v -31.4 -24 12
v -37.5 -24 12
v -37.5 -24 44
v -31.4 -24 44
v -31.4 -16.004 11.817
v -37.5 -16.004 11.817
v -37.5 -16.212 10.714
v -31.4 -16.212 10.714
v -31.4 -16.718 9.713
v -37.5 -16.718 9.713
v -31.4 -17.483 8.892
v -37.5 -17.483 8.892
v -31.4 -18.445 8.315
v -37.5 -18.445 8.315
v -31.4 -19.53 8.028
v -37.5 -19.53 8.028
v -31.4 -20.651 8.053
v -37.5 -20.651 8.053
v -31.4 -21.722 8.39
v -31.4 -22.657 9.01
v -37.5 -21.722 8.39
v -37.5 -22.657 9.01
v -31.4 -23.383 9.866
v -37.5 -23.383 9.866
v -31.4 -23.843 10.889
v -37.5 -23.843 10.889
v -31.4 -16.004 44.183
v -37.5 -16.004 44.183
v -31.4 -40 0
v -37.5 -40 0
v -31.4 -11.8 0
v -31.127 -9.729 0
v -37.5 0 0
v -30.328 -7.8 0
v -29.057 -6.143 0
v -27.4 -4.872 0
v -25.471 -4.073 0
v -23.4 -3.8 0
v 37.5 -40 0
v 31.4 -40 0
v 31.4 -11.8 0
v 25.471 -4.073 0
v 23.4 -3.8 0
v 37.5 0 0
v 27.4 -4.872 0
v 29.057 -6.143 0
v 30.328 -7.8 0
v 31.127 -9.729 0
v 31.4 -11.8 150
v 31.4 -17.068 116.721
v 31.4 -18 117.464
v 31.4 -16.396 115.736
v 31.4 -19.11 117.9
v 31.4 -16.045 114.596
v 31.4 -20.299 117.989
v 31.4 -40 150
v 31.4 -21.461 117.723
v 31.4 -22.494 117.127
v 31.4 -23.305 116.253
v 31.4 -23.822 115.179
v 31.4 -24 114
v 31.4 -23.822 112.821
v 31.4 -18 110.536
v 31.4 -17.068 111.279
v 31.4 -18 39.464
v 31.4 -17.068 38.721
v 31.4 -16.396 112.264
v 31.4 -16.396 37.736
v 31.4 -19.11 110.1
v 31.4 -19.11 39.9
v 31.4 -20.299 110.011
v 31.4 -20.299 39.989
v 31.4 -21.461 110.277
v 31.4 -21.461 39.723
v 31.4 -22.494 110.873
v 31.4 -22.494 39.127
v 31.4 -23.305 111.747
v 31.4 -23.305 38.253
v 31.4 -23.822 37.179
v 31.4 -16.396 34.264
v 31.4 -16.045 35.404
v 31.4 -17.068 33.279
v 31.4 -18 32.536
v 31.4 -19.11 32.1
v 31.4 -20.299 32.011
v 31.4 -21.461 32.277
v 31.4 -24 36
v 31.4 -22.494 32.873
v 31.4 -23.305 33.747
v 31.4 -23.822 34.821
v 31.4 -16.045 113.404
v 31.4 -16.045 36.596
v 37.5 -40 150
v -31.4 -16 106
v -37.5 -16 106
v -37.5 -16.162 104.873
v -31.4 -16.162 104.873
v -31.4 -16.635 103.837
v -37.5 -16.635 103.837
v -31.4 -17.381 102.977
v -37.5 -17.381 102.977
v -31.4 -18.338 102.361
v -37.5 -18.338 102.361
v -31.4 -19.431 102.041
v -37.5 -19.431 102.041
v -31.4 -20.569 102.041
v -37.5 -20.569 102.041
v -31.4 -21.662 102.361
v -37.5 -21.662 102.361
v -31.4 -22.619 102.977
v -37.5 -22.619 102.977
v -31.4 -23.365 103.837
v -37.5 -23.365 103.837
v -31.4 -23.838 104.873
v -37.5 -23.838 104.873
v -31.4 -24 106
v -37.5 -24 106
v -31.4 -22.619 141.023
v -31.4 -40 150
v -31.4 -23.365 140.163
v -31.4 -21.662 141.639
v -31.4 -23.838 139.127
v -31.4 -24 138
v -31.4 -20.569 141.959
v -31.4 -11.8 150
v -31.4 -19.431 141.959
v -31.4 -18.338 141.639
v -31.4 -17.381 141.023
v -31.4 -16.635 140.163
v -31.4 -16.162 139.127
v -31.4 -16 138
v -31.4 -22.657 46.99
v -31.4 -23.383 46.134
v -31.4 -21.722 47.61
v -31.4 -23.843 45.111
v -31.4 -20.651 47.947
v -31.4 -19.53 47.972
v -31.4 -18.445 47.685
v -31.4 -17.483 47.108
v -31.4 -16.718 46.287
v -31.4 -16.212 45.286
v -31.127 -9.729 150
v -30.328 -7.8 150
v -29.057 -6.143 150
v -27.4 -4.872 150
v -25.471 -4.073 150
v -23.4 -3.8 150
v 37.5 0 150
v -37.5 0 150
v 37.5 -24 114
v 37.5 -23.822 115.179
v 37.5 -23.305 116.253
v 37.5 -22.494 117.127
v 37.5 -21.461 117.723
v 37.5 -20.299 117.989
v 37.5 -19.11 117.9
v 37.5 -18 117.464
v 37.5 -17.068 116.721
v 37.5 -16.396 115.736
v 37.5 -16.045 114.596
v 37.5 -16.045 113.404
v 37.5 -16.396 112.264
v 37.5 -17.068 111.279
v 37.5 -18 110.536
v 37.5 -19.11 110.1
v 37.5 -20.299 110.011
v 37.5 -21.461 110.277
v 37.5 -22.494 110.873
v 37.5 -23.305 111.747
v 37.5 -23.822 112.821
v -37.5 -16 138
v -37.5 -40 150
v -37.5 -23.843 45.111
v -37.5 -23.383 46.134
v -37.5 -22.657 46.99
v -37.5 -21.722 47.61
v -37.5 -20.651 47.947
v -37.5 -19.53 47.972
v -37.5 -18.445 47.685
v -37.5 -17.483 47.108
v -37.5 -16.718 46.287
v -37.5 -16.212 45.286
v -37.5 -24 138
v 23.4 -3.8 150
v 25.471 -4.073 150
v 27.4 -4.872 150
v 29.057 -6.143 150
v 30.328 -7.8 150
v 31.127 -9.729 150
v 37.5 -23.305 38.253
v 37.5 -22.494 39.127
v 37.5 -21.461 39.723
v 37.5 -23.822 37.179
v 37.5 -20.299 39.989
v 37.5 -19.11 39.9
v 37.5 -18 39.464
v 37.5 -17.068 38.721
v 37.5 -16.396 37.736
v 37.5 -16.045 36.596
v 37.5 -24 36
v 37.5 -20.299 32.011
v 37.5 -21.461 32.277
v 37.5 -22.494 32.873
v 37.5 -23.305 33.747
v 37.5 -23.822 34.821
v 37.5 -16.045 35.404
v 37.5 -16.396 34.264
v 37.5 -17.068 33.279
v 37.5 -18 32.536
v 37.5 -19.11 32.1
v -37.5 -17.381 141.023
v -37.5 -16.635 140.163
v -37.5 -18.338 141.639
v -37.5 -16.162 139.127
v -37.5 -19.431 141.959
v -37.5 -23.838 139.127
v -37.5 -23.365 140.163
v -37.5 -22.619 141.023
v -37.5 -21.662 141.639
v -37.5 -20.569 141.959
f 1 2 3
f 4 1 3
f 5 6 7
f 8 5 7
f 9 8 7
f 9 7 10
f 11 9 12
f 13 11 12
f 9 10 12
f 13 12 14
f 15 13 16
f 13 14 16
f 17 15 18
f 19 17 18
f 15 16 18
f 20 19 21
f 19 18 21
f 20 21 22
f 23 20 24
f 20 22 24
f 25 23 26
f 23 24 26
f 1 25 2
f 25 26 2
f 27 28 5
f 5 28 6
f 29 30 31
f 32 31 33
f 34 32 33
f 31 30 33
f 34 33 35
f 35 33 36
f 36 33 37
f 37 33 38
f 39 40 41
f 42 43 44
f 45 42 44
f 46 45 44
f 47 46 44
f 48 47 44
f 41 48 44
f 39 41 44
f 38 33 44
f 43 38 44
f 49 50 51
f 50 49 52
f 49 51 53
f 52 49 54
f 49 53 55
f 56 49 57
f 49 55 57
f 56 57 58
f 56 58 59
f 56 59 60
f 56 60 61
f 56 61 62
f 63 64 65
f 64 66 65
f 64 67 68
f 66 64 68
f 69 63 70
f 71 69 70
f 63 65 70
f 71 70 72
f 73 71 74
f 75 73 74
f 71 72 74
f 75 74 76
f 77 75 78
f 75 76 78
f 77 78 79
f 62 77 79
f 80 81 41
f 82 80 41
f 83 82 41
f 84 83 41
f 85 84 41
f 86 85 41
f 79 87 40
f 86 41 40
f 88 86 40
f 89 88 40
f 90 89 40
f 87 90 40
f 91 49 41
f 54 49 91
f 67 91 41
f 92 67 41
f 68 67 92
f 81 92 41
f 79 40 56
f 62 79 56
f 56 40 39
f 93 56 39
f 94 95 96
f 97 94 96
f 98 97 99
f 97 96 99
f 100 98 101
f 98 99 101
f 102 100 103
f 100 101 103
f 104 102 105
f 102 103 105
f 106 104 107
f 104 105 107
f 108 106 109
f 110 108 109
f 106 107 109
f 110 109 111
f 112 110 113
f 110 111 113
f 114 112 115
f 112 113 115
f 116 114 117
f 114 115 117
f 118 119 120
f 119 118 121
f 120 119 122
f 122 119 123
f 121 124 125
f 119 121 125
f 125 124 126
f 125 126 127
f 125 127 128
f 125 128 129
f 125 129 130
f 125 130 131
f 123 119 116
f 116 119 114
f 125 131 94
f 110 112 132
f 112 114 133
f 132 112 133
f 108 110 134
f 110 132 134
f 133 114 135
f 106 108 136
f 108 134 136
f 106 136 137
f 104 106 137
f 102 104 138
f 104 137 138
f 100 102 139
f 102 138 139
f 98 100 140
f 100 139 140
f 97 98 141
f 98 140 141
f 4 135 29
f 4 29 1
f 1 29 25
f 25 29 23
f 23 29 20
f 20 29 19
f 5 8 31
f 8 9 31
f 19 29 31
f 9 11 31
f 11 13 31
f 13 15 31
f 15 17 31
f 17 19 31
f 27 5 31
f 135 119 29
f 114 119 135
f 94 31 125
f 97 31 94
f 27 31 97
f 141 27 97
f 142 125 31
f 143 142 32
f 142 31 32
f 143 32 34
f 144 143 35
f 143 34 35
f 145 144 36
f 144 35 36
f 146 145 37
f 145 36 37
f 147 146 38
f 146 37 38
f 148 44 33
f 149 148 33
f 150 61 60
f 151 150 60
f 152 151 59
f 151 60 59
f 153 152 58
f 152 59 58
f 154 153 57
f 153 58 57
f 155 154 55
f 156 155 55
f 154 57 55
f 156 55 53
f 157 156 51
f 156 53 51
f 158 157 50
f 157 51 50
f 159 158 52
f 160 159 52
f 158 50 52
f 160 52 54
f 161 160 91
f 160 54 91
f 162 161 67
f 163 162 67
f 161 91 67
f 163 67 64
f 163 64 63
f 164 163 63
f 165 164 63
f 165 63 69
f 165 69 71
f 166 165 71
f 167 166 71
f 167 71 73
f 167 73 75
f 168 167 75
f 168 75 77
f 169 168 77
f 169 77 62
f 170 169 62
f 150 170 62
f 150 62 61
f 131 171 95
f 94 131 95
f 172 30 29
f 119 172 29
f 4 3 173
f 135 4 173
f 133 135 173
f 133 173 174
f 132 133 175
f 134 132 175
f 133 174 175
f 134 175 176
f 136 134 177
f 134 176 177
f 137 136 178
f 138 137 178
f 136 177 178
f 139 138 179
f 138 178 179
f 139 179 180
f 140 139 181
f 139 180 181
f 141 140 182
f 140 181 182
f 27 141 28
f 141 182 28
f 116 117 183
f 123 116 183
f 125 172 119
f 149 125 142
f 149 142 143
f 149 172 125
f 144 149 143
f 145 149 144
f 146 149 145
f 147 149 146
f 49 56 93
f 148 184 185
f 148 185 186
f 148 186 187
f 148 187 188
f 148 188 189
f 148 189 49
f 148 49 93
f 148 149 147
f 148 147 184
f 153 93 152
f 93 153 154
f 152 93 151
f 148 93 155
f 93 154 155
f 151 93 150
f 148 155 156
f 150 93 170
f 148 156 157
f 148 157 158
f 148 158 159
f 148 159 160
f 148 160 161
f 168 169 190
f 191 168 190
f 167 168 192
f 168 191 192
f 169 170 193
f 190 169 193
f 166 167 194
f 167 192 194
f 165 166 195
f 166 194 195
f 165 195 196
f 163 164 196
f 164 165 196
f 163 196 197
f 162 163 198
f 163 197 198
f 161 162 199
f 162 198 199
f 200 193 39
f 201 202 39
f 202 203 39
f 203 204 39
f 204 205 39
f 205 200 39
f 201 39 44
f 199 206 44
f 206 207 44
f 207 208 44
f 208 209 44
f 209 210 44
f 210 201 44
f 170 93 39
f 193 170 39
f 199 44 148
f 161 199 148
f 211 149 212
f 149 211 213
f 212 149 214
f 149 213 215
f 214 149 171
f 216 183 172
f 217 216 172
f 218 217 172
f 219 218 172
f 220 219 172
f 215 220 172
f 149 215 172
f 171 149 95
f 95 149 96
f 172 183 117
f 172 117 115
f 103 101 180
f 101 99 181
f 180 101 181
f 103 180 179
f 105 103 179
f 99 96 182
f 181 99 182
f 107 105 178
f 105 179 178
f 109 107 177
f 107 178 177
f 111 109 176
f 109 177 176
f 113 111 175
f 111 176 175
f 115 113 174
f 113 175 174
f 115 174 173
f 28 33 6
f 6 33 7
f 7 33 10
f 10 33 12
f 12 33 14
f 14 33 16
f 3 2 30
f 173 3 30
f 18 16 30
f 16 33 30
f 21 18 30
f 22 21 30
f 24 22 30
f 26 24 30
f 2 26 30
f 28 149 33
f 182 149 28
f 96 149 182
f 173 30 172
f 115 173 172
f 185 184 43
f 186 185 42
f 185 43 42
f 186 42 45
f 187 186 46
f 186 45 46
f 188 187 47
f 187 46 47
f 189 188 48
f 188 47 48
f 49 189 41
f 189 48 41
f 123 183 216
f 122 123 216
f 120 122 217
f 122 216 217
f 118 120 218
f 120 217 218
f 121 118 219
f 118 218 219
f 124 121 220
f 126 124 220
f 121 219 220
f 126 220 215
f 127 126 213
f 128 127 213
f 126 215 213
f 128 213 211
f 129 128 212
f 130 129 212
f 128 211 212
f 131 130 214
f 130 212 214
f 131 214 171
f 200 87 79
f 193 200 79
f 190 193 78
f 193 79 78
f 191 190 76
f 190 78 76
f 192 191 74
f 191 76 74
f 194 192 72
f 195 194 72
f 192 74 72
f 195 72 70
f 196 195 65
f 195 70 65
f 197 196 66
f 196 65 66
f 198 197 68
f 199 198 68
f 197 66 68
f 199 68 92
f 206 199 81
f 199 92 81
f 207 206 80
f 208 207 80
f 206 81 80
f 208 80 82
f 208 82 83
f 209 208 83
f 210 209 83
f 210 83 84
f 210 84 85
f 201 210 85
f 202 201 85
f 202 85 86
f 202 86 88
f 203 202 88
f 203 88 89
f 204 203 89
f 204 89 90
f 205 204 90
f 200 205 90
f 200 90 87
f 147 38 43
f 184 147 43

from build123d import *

# Parameters (mm, degrees)
F1_DEPTH = 150
F3_D     = 8
F3_DEPTH = 7
F3_TIP   = 2.4034424761
F5_DEPTH = 6.1


with BuildPart() as f1:
    # F0 (on Top) → F1 (new body)
    with BuildSketch(Plane.XY):
        with BuildLine():
            Line((37.5, 0), (-37.5, 0))
            Line((-37.5, 0), (-37.5, -40))
            Line((-37.5, -40), (-31.4, -40))
            Line((-31.4, -40), (-31.4, -11.8))
            ThreePointArc((-31.4, -11.8), (-29.0568542495, -6.1431457505), (-23.4, -3.8))
            Line((-23.4, -3.8), (23.4, -3.8))
            ThreePointArc((23.4, -3.8), (29.0568542495, -6.1431457505), (31.4, -11.8))
            Line((31.4, -11.8), (31.4, -40))
            Line((31.4, -40), (37.5, -40))
            Line((37.5, -40), (37.5, 0))
        make_face()
    extrude(amount=F1_DEPTH)

    # F3
    with Locations(Plane.YZ.offset(37.5)):
        with Locations((-20, 114), (-20, 36)):
            Hole(F3_D / 2, depth=F3_DEPTH)
            with Locations((0, 0, -(F3_DEPTH + F3_TIP / 2))):  # 118° drill point
                Cone(0, F3_D / 2, F3_TIP, mode=Mode.SUBTRACT)

    # F4 (on face) → F5 (cut, through all)
    with BuildSketch(Plane(origin=(-37.5, 0, 0), x_dir=(0, -1, 0), z_dir=(-1, 0, 0))):
        with BuildLine():
            Line((24, 106), (24, 138))
            ThreePointArc((24, 138), (20, 142), (16, 138))
            Line((16, 138), (16, 106))
            ThreePointArc((16, 106), (20, 110), (24, 106))
        make_face()
        with BuildLine():
            ThreePointArc((16, 106), (20, 102), (24, 106))
            ThreePointArc((24, 106), (20, 110), (16, 106))
        make_face()
        with BuildLine():
            ThreePointArc((16.0041883178, 43.817), (20.0915239614, 40.0010472165), (24, 44))
            ThreePointArc((24, 44), (20.0915239614, 47.9989527835), (16.0041883178, 44.183))
            Line((16.0041883178, 44.183), (16.0041883178, 43.817))
        make_face()
        with BuildLine():
            Line((16.0041883178, 12.183), (16.0041883178, 11.817))
            ThreePointArc((16.0041883178, 11.817), (20.0915239614, 8.0010472165), (24, 12))
            ThreePointArc((24, 12), (20.0915239614, 15.9989527835), (16.0041883178, 12.183))
        make_face()
        with BuildLine():
            ThreePointArc((16.0041883178, 12.183), (20.0915239614, 15.9989527835), (24, 12))
            Line((24, 12), (24, 44))
            ThreePointArc((24, 44), (20.0915239614, 40.0010472165), (16.0041883178, 43.817))
            Line((16.0041883178, 43.817), (16.0041883178, 12.183))
        make_face()
    extrude(amount=-F5_DEPTH, mode=Mode.SUBTRACT)


solid = f1.part
